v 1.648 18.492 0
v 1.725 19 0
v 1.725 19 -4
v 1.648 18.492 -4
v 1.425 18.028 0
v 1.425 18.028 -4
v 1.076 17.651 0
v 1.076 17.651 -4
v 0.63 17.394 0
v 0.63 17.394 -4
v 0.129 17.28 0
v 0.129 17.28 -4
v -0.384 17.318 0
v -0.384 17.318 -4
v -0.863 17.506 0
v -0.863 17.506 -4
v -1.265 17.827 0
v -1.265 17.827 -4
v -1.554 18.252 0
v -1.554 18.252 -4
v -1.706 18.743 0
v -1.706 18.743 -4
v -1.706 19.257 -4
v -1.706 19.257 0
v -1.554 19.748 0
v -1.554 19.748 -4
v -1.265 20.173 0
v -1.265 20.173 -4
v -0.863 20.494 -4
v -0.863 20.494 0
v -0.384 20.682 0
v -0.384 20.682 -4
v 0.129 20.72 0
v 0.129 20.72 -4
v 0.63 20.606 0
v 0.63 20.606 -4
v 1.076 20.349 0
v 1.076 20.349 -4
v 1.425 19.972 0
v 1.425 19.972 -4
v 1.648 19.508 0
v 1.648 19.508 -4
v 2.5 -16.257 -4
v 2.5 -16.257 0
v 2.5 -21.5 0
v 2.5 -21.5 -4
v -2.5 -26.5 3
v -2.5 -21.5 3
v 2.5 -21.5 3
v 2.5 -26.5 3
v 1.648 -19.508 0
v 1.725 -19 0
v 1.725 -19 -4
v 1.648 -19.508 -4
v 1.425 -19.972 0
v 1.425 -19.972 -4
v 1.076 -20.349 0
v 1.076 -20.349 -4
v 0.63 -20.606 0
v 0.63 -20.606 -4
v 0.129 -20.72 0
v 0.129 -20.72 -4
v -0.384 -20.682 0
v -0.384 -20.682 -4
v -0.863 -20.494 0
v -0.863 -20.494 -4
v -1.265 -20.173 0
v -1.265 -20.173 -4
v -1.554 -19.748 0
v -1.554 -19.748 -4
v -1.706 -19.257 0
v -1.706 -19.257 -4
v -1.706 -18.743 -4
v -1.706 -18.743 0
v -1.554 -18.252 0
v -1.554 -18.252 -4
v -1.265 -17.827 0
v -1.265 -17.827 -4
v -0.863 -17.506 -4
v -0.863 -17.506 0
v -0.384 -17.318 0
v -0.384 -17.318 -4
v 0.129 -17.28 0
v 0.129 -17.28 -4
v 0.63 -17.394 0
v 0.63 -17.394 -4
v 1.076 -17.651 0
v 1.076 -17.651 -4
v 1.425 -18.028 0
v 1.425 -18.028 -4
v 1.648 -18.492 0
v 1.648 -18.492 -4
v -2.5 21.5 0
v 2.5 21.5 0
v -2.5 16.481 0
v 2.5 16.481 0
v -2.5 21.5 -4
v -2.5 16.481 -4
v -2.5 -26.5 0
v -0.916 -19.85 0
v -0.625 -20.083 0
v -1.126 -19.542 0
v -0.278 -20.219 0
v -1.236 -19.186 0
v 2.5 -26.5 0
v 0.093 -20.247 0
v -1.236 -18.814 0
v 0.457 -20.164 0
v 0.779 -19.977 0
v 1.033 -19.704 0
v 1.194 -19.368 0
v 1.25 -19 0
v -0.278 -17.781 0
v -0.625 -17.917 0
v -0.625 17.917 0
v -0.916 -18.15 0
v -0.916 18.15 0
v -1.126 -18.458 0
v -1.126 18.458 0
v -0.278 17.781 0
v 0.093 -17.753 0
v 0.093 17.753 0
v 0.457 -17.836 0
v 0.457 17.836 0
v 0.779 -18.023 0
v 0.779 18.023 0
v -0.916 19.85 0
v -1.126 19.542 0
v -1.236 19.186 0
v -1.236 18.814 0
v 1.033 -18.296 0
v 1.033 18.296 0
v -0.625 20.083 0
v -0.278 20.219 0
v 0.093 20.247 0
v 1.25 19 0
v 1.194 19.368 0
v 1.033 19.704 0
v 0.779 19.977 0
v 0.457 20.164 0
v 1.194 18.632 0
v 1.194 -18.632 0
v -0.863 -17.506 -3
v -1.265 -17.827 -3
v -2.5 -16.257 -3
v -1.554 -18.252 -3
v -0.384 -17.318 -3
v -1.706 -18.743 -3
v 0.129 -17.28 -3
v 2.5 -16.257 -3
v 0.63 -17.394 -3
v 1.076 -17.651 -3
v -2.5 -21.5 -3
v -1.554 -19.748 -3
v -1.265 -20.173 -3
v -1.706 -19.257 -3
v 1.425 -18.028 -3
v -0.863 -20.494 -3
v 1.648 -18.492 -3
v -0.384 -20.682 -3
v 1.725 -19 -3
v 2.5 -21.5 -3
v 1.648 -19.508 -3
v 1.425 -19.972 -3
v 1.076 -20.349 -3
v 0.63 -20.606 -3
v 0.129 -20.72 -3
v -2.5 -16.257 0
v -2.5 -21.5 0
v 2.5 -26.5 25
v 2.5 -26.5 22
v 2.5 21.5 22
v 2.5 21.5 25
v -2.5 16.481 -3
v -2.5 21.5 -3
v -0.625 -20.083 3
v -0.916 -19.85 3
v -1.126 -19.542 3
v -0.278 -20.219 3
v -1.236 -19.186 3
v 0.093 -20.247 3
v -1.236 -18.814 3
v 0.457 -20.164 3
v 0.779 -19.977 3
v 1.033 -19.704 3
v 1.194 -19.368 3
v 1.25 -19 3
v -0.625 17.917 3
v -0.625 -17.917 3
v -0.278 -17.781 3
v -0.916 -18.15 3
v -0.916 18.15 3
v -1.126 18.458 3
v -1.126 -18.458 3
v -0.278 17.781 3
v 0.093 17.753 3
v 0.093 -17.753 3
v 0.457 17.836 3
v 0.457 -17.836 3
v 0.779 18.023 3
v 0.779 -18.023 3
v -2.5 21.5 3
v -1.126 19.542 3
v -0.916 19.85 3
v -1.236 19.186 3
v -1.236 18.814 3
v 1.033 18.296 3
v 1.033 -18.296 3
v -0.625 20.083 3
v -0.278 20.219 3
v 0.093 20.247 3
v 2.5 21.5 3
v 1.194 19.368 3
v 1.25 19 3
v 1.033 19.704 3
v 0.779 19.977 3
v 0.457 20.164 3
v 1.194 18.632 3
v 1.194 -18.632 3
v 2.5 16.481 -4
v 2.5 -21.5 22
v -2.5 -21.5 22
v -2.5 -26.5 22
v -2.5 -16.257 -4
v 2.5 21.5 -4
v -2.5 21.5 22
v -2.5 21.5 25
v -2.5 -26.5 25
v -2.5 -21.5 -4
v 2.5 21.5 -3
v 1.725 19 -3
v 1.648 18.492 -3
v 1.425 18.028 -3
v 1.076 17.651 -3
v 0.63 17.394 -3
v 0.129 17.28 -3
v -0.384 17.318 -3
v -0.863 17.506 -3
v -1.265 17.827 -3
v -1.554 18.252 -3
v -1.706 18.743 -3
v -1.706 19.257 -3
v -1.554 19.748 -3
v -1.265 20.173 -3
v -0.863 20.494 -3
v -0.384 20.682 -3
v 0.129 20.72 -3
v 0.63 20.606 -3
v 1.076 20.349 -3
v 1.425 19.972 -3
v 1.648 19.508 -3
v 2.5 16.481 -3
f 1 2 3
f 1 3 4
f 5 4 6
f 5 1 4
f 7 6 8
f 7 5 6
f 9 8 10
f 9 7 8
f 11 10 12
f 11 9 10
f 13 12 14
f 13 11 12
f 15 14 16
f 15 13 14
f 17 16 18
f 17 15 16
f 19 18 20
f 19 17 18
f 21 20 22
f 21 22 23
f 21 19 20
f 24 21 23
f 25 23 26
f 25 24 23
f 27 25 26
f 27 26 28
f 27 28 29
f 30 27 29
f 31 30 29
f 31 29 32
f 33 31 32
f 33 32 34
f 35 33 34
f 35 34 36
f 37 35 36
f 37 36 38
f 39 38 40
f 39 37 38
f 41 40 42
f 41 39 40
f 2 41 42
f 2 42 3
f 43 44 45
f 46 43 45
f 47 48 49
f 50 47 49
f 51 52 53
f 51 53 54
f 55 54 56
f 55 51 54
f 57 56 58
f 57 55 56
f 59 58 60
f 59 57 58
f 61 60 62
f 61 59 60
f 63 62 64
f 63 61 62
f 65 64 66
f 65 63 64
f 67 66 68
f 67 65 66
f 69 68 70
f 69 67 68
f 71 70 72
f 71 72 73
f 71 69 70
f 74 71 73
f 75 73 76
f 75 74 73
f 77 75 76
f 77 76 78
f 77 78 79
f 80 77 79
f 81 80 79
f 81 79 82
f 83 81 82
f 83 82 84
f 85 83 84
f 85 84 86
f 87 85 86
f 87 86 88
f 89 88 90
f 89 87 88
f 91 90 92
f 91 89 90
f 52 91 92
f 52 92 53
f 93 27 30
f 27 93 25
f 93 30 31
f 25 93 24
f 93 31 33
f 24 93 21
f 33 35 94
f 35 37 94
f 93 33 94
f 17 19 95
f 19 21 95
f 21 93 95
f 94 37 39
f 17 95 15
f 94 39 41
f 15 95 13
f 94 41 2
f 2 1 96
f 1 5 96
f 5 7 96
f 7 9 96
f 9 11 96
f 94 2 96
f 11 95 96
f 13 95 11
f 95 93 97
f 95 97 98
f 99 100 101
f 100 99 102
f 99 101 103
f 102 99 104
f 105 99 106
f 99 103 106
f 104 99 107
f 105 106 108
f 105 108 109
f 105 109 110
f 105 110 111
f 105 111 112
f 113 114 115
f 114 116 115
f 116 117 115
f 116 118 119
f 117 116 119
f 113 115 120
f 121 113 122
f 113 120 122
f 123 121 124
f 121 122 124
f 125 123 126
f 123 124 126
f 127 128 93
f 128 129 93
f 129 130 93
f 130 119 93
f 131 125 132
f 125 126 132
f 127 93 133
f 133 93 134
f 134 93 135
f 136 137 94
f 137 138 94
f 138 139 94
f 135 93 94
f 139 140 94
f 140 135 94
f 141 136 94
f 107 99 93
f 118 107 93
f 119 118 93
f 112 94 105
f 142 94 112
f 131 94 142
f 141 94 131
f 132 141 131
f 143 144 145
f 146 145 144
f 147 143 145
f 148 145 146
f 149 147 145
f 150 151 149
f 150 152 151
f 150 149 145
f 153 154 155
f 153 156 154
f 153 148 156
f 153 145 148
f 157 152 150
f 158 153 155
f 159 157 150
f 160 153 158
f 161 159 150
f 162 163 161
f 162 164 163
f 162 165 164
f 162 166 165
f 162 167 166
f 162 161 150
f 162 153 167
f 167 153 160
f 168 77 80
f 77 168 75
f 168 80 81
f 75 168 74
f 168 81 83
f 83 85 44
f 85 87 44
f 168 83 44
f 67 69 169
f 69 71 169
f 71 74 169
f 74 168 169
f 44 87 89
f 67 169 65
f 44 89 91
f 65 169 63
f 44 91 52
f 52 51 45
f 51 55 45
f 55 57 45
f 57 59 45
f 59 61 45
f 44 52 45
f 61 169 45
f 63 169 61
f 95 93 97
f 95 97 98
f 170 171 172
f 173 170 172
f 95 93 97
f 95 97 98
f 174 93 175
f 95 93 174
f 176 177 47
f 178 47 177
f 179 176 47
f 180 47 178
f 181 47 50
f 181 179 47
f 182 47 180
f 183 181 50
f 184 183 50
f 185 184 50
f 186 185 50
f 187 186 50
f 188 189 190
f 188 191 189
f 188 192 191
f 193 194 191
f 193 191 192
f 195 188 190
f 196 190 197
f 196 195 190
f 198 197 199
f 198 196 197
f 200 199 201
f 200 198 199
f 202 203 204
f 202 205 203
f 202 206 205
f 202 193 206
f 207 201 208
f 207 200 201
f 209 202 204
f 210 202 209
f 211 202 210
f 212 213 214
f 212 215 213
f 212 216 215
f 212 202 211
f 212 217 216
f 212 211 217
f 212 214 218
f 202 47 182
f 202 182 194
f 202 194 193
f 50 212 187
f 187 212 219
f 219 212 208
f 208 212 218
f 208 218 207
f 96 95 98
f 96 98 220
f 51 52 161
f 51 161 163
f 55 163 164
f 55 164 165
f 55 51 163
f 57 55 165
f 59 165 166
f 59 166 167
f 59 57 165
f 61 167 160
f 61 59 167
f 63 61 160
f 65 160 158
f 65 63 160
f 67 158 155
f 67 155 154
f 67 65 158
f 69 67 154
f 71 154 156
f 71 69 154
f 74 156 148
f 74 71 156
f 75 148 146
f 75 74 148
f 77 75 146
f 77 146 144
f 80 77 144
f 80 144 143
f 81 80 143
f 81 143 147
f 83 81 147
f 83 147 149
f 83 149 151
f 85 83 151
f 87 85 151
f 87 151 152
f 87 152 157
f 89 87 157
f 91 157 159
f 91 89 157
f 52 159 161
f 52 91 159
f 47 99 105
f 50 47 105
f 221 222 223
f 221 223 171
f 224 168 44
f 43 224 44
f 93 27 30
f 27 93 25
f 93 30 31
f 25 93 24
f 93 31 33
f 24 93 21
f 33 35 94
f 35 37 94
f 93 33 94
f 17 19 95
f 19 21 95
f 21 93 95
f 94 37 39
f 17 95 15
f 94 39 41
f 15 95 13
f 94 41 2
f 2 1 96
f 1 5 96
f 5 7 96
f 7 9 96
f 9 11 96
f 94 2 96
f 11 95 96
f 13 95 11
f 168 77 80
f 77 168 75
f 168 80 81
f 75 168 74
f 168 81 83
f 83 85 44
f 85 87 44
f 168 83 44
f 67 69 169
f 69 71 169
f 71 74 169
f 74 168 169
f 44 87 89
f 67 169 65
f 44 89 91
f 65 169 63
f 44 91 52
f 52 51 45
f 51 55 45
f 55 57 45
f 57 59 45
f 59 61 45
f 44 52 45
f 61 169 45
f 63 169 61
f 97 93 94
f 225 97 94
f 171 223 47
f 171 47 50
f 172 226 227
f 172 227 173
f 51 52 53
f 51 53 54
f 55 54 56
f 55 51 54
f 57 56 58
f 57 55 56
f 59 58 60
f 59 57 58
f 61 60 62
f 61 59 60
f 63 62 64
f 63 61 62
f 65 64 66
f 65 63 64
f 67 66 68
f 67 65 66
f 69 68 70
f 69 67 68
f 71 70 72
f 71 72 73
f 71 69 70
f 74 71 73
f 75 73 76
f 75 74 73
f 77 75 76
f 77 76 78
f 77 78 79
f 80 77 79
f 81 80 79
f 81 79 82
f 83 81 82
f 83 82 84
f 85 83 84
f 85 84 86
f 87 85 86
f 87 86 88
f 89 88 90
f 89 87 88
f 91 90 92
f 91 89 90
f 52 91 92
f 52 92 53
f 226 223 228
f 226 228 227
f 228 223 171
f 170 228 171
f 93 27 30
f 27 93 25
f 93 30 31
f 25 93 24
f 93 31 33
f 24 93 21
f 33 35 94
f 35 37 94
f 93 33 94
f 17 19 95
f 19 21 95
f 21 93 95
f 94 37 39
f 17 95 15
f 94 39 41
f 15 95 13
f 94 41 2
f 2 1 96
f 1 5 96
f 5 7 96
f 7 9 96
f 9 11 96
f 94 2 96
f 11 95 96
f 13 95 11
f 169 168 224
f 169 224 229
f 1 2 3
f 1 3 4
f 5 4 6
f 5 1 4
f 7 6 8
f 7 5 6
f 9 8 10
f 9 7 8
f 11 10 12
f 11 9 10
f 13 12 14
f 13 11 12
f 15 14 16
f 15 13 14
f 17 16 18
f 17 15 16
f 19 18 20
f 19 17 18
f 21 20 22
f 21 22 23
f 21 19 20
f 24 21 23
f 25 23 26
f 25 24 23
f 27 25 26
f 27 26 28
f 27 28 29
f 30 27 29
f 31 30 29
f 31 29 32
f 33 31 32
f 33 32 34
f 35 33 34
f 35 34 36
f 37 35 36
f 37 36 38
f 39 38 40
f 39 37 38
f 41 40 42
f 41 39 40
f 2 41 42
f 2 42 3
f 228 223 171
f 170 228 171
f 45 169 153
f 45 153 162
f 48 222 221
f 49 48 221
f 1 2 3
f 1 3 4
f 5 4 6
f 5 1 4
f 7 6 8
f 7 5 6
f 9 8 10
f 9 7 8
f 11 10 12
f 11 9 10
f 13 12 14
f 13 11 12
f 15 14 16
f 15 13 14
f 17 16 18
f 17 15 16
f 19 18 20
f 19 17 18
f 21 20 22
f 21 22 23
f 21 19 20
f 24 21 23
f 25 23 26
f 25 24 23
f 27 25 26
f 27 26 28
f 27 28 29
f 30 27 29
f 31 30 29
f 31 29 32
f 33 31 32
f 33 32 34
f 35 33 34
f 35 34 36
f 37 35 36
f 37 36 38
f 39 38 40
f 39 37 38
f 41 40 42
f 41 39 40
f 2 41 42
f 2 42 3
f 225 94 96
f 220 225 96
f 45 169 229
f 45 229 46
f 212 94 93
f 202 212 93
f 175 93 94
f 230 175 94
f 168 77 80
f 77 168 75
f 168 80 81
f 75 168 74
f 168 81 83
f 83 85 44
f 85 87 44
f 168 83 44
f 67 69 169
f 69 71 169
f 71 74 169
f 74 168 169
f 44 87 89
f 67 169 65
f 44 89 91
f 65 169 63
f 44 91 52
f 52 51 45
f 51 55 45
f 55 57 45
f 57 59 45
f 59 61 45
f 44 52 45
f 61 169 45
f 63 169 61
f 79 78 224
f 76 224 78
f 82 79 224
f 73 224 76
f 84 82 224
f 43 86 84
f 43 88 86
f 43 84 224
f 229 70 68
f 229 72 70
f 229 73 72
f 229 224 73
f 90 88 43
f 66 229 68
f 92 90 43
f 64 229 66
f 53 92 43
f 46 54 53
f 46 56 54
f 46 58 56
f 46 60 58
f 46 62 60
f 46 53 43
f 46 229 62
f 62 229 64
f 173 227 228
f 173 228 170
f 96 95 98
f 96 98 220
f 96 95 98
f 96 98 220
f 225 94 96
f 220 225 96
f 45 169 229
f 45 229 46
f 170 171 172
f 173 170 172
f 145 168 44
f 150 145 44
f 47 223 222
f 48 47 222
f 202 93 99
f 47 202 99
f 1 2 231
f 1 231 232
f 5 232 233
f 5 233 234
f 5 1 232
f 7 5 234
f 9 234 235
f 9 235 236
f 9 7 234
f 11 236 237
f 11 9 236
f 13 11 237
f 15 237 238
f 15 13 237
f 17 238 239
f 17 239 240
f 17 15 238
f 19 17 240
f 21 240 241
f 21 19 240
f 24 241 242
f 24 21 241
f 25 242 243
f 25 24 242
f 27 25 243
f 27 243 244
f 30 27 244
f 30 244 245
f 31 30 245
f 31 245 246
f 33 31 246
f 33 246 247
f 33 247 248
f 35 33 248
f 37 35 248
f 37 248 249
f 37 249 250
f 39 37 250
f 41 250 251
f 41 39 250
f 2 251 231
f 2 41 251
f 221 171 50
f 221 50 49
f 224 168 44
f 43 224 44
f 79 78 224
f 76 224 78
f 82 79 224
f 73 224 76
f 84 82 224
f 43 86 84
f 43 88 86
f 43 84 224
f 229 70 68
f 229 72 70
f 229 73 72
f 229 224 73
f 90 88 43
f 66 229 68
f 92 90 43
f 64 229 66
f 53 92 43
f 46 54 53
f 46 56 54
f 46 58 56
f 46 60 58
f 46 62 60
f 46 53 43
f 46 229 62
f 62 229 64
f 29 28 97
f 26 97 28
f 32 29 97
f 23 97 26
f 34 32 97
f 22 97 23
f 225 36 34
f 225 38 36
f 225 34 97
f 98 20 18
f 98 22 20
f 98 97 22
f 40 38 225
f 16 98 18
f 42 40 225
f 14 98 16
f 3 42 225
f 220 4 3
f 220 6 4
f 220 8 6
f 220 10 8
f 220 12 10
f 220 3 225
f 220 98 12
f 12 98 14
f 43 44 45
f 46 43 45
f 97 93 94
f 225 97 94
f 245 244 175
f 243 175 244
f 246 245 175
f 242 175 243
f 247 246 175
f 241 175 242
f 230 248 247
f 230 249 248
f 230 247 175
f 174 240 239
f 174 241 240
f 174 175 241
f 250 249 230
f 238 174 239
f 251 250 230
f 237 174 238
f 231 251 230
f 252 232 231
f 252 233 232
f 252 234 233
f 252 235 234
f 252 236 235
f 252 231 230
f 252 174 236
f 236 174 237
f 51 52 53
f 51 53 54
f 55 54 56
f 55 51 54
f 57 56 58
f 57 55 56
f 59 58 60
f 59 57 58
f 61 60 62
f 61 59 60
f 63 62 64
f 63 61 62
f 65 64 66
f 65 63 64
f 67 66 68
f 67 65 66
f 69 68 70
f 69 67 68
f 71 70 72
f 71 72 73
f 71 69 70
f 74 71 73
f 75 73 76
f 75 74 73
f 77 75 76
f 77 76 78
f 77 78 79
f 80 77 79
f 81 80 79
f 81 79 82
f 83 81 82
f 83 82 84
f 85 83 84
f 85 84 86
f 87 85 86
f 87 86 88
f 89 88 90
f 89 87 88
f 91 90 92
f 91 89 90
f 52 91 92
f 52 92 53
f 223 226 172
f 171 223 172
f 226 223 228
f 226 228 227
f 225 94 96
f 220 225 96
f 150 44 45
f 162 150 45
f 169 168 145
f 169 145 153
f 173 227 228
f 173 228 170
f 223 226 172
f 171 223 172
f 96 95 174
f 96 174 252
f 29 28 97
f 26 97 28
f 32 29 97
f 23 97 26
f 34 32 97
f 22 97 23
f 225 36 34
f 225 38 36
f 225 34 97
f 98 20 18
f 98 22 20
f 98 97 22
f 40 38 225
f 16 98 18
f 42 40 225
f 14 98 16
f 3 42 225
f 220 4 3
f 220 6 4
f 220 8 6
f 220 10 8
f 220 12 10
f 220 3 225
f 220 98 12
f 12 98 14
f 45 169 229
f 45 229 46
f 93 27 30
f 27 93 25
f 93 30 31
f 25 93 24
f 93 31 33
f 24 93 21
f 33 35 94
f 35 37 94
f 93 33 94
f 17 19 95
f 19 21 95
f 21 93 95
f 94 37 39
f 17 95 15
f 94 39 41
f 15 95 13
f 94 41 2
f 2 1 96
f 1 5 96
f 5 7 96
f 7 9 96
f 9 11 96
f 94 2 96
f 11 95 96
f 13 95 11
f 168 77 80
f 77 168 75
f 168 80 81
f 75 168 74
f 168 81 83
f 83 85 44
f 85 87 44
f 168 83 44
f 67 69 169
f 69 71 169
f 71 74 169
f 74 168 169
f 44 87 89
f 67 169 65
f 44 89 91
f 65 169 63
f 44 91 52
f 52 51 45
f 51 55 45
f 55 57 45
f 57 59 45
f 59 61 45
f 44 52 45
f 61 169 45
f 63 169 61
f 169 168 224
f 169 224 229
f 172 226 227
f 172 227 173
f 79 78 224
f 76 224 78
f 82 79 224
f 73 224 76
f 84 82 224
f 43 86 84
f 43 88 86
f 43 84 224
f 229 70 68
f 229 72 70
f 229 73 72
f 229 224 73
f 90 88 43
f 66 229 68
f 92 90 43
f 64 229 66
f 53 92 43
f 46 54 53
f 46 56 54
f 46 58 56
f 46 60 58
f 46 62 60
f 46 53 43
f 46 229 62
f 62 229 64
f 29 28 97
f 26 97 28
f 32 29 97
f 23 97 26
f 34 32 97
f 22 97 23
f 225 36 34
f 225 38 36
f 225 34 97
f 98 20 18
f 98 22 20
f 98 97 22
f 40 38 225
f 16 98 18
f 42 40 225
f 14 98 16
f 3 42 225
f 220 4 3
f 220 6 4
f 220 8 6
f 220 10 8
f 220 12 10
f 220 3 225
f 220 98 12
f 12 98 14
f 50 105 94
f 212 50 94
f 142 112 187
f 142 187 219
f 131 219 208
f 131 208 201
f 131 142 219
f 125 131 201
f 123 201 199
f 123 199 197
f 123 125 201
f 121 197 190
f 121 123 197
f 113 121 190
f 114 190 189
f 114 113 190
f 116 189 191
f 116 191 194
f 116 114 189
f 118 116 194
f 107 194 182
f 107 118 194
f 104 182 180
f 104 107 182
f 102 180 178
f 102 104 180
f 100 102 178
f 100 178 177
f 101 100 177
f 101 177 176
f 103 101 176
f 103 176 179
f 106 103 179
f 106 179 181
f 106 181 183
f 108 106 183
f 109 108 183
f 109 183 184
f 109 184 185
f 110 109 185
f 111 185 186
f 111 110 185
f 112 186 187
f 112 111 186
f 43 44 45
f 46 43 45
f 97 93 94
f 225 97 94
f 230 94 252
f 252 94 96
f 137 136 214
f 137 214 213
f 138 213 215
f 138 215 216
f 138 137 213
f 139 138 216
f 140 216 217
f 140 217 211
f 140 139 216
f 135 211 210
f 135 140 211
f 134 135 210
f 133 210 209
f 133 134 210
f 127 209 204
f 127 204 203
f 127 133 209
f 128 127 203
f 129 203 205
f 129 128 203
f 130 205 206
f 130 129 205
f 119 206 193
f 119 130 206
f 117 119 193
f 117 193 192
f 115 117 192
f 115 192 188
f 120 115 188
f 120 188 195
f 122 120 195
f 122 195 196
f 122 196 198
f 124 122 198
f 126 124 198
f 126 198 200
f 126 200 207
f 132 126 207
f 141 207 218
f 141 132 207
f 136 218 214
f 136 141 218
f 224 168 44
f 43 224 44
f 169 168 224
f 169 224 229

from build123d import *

# Parameters (mm, degrees)
SKETCH_R         = 1.25
PAD_DEPTH        = 3
SKETCH002_W      = 5
SKETCH002_H      = 5
EXTRUDE_DEPTH    = 19
SKETCH003_W      = 5
SKETCH003_H      = 48
EXTRUDE001_DEPTH = 3
EXTRUDE002_DEPTH = 3
SKETCH004_W      = 5
SKETCH004_H      = 5.019411
SKETCH004_R      = 1.725
SKETCH004_H_2    = 5.242643
EXTRUDE003_DEPTH = 3
EXTRUDE004_DEPTH = 4
EXTRUDE005_DEPTH = 4
EXTRUDE006_DEPTH = 4


with BuildPart() as body:
    # Sketch → Pad (new body)
    with BuildSketch(Plane.XY):
        Polygon((-2.5, 21.5), (-2.5, -21.5), (-2.5, -26.5), (2.5, -26.5), (2.5, -21.5), (2.5, 21.5), align=None)
        with Locations((0, 19)):
            Circle(SKETCH_R, mode=Mode.SUBTRACT)
        with Locations((0, -19)):
            Circle(SKETCH_R, mode=Mode.SUBTRACT)
    extrude(amount=PAD_DEPTH)


with BuildPart() as extrude_body:
    # Sketch002 (on Face10 of Pad) → Extrude (new body)
    with BuildSketch(Plane.XY.offset(3)):
        with Locations((0, -24)):
            Rectangle(SKETCH002_W, SKETCH002_H)
    extrude(amount=EXTRUDE_DEPTH)


with BuildPart() as extrude001:
    # Sketch003 (on Face6 of Extrude) → Extrude001 (new body)
    with BuildSketch(Plane.XY.offset(22)):
        with Locations((0, -2.5)):
            Rectangle(SKETCH003_W, SKETCH003_H)
    extrude(amount=EXTRUDE001_DEPTH)


with BuildPart() as extrude002:
    # Sketch003 (on Face6 of Extrude) → Extrude002 (new body)
    with BuildSketch(Plane.XY.offset(22)):
        with Locations((0, -2.5)):
            Rectangle(SKETCH003_W, SKETCH003_H)
    extrude(amount=EXTRUDE002_DEPTH)


with BuildPart() as extrude003:
    # Sketch004 (on Face9 of Pad) → Extrude003 (new body)
    with BuildSketch(Plane(origin=(0, 0, 0), x_dir=(1, 0, 0), z_dir=(0, 0, -1))):
        with Locations((0, -18.990294)):
            Rectangle(SKETCH004_W, SKETCH004_H)
        with Locations((0, -19)):
            Circle(SKETCH004_R, mode=Mode.SUBTRACT)
        with Locations((0, 18.878678)):
            Rectangle(SKETCH004_W, SKETCH004_H_2)
        with Locations((0, 19)):
            Circle(SKETCH004_R, mode=Mode.SUBTRACT)
    extrude(amount=EXTRUDE003_DEPTH)


with BuildPart() as extrude004:
    # Sketch004 (on Face9 of Pad) → Extrude004 (new body)
    with BuildSketch(Plane(origin=(0, 0, 0), x_dir=(1, 0, 0), z_dir=(0, 0, -1))):
        with Locations((0, -18.990294)):
            Rectangle(SKETCH004_W, SKETCH004_H)
        with Locations((0, -19)):
            Circle(SKETCH004_R, mode=Mode.SUBTRACT)
        with Locations((0, 18.878678)):
            Rectangle(SKETCH004_W, SKETCH004_H_2)
        with Locations((0, 19)):
            Circle(SKETCH004_R, mode=Mode.SUBTRACT)
    extrude(amount=EXTRUDE004_DEPTH)


with BuildPart() as extrude005:
    # Sketch004 (on Face9 of Pad) → Extrude005 (new body)
    with BuildSketch(Plane(origin=(0, 0, 0), x_dir=(1, 0, 0), z_dir=(0, 0, -1))):
        with Locations((0, -18.990294)):
            Rectangle(SKETCH004_W, SKETCH004_H)
        with Locations((0, -19)):
            Circle(SKETCH004_R, mode=Mode.SUBTRACT)
        with Locations((0, 18.878678)):
            Rectangle(SKETCH004_W, SKETCH004_H_2)
        with Locations((0, 19)):
            Circle(SKETCH004_R, mode=Mode.SUBTRACT)
    extrude(amount=EXTRUDE005_DEPTH)


with BuildPart() as extrude006:
    # Sketch004 (on Face9 of Pad) → Extrude006 (new body)
    with BuildSketch(Plane(origin=(0, 0, 0), x_dir=(1, 0, 0), z_dir=(0, 0, -1))):
        with Locations((0, -18.990294)):
            Rectangle(SKETCH004_W, SKETCH004_H)
        with Locations((0, -19)):
            Circle(SKETCH004_R, mode=Mode.SUBTRACT)
        with Locations((0, 18.878678)):
            Rectangle(SKETCH004_W, SKETCH004_H_2)
        with Locations((0, 19)):
            Circle(SKETCH004_R, mode=Mode.SUBTRACT)
    extrude(amount=EXTRUDE006_DEPTH)


solid = Compound([body.part, extrude_body.part, extrude001.part, extrude002.part, extrude003.part, extrude004.part, extrude005.part, extrude006.part])
